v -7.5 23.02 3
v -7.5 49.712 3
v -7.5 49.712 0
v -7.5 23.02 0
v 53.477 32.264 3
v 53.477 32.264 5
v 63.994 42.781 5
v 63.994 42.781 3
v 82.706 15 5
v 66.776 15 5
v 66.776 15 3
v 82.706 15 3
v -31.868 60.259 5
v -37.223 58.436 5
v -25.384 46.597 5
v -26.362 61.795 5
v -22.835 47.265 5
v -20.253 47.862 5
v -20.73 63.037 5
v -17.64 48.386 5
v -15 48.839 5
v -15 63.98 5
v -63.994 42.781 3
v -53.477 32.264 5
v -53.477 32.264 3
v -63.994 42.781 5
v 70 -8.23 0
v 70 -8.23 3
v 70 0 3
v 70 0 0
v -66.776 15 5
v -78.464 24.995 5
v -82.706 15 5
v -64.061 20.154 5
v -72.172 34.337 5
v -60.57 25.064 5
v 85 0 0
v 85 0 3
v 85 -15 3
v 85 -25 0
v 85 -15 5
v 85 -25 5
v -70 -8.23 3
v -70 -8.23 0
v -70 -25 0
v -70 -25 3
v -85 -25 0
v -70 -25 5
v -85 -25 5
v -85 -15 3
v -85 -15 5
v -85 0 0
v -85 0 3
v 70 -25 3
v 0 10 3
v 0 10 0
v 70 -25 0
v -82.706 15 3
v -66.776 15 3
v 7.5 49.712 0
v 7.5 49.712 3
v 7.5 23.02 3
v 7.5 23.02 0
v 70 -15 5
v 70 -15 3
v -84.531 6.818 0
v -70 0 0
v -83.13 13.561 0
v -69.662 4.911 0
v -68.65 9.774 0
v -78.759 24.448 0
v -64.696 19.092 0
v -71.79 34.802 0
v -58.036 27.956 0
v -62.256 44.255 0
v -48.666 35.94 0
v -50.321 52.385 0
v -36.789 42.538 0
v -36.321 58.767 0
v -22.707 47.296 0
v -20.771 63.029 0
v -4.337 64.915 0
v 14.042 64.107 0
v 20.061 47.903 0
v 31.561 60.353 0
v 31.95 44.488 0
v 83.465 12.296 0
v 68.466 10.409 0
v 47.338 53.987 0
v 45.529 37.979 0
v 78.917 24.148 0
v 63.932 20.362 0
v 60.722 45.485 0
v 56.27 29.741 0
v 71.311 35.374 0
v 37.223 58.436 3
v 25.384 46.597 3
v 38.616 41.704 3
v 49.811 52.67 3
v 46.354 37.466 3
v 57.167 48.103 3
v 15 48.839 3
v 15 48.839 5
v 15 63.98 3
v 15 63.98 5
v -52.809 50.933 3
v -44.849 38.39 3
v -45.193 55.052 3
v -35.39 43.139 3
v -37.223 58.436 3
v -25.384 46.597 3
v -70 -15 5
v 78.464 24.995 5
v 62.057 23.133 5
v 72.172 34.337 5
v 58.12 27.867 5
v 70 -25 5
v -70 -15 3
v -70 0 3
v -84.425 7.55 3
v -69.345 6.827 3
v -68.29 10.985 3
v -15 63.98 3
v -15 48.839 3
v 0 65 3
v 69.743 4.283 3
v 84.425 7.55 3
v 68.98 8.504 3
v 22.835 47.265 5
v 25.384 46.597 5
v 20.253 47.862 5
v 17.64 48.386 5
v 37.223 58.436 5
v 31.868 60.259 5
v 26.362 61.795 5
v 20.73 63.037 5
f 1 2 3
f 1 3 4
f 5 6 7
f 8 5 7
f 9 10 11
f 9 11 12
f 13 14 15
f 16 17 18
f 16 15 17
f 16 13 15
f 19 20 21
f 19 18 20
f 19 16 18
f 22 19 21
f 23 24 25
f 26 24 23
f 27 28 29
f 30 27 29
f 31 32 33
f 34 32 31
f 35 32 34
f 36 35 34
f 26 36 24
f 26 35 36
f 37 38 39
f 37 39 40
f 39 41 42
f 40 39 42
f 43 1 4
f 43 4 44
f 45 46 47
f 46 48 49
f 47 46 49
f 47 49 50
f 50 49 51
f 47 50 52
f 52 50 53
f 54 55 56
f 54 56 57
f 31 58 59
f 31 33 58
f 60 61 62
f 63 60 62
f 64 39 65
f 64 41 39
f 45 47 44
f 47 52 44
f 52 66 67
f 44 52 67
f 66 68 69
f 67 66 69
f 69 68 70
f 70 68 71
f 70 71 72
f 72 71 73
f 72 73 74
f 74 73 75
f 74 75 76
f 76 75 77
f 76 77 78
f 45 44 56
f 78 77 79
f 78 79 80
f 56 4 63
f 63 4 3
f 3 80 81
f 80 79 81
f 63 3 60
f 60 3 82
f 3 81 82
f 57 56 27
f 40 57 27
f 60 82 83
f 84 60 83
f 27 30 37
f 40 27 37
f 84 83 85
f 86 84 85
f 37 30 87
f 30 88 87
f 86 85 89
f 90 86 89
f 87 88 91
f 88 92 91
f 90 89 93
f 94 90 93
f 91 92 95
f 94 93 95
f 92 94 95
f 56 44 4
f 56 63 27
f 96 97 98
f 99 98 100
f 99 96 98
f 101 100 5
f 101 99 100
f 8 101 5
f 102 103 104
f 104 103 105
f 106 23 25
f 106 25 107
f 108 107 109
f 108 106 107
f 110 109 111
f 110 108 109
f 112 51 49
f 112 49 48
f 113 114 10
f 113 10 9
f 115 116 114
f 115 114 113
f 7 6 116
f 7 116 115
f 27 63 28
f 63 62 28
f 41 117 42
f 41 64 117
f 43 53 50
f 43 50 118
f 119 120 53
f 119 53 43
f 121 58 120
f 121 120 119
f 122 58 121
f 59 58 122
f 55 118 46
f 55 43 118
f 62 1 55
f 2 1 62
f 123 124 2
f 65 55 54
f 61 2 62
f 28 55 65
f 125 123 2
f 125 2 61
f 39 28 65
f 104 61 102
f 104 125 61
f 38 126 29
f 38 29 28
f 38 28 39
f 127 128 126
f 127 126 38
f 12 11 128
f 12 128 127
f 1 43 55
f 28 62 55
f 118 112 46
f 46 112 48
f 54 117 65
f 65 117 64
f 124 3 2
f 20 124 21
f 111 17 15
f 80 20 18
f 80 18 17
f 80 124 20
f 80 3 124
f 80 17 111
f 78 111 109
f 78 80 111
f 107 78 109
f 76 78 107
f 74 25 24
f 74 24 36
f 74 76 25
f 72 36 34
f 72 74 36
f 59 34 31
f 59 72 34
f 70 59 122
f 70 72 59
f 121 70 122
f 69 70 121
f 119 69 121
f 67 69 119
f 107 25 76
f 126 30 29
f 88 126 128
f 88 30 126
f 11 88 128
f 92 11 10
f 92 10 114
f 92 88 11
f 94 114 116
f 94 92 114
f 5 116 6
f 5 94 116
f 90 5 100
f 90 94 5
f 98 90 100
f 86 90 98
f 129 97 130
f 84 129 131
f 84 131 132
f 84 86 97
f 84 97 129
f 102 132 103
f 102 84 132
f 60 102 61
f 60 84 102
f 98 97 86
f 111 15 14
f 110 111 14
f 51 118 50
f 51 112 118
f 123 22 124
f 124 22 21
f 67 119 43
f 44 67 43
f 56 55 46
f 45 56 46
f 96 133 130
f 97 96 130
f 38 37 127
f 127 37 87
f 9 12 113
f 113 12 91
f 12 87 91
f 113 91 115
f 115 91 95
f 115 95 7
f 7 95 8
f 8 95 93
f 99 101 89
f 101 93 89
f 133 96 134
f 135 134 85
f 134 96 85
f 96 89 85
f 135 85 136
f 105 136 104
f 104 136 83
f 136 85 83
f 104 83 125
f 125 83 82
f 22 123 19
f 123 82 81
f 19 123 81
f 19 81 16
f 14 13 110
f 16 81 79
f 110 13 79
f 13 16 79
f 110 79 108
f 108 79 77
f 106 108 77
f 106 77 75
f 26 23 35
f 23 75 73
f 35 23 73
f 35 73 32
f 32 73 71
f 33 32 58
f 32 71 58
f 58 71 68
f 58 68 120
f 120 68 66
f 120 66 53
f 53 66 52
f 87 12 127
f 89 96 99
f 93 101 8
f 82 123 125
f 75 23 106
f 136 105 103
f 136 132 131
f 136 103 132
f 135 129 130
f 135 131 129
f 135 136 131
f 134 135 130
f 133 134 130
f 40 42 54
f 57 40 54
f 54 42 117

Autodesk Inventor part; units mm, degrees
ref_plane "YZ Plane" through (0, 0, 0) normal (1, 0, 0) x (0, 1, 0)
ref_plane "XZ Plane" through (0, 0, 0) normal (0, 1, 0) x (-1, 0, 0)
ref_plane "XY Plane" through (0, 0, 0) normal (0, 0, 1) x (1, 0, 0)
sketch "Skizze1" plane through (0, 0, 0) normal (1, 0, 0) x (0, 1, 0)
  point P0 (0, 0)
sketch "Skizze2" plane through (0, 0, 0) normal (0, 0, 1) x (1, 0, 0)
  line L0 (0, 0) -> (0, 50)
  ellipse E0 centre (0, 0) end of major axis (0, 50) minor radius 70
  ellipse E1 centre (0, 0) end of major axis (85, 0) minor radius 65
  point P0 (0, 65)
  dimension "d3" = 70
  dimension "d4" = 85
  dimension "d1" = 50
  dimension "d5" = 15
extrude "Extrusion1" add sketch "Skizze2" along normal blind 5
sketch "Skizze4" plane through (0, 0, 5) normal (0, 0, 1) x (1, 0, 0)
  line L0 (-138.5421, 0) -> (141.5539, 0)
  line L1 (141.5539, 0) -> (141.5539, -100.2494)
  line L2 (141.5539, -100.2494) -> (-138.5421, -100.2494)
  line L3 (-138.5421, -100.2494) -> (-138.5421, 0)
extrude "Extrusion3" cut sketch "Skizze4" against normal blind 5
sketch "Skizze5" plane through (0, 0, 5) normal (0, 0, 1) x (1, 0, 0)
  line L0 (-85, 0) -> (-70, 0)
  line L1 (-70, 0) -> (-70, -25)
  line L2 (-70, -25) -> (-85, -25)
  line L3 (-85, -25) -> (-85, 0)
  line L4 (70, 0) -> (85, 0)
  line L5 (85, 0) -> (85, -25)
  line L6 (85, -25) -> (70, -25)
  line L7 (70, -25) -> (70, 0)
  dimension "d13" = 25
  dimension "d14" = 25
extrude "Extrusion4" add sketch "Skizze5" against normal blind 5
sketch "Skizze7" plane through (0, 0, 5) normal (0, 0, 1) x (1, 0, 0)
  line L0 (14.5161, 65.7113) -> (16.129, 65.7113)
  line L1 (16.129, 65.7113) -> (16.129, 66.0339)
  line L2 (16.129, 66.0339) -> (14.5161, 66.0339)
  line L3 (14.5161, 66.0339) -> (14.5161, 65.7113)
  line L4 (-15, 28.2919) -> (15, 28.2919)
  line L5 (15, 28.2919) -> (15, 68.6145)
  line L6 (15, 68.6145) -> (-15, 68.6145)
  line L7 (-15, 68.6145) -> (-15, 28.2919)
  line L8 (-70, -25) -> (-85, -25) projected
  line L9 (-85, -25) -> (-85, 0) projected
  ellipse E0 centre (0, 0) end of major axis (-85, 0) minor radius 65 (85, 0) -> (-85, 0) ccw projected
  line L10 (85, 0) -> (85, -25) projected
  line L11 (85, -25) -> (70, -25) projected
  line L12 (70, -25) -> (70, 0) projected
  ellipse E1 centre (0, 0) end of major axis (-70, 0) minor radius 50 (70, 0) -> (-70, 0) ccw projected
  line L13 (-70, 0) -> (-70, -25) projected
  line L14 (0, -43.7229) -> (0, 87.3374) projected
  dimension "d20" = 30
extrude "Extrusion5" cut sketch "Skizze7" against normal blind 2 contours L3 L2 L5 L0 | L0 L5 E0 L14 L6 L2 L3 | L5 E1 L14 E0 | L5 L4 L14 E1 | L14 E1 L7 E0 | E0 L7 L6 L14 | L14 L4 L7 E1
sketch "Skizze8" plane through (0, 0, 5) normal (0, 0, 1) x (1, 0, 0)
  ellipse E0 centre (0, 0) end of major axis (-85, 0) minor radius 65 (85, 0) -> (15, 63.9799) ccw projected
  line L0 (0, 0) -> (49.3064, 49.3064) construction
  line L1 (-121.351, 0) -> (133.1061, 0) construction
  line L2 (76.2939, 97.5071) -> (19.9385, 41.1517)
  line L3 (19.9385, 41.1517) -> (41.1517, 19.9385)
  line L4 (41.1517, 19.9385) -> (92.1355, 70.9223)
  line L5 (76.2939, 97.5071) -> (92.1355, 70.9223)
  dimension "d23" = 45
  dimension "d24" = 30
extrude "Extrusion6" cut sketch "Skizze8" against normal blind 2
sketch "Skizze9" plane through (0, 0, 5) normal (0, 0, 1) x (1, 0, 0)
  line L0 (52.5724, 15) -> (140.4, 15)
  line L1 (140.4, 15) -> (140.4, -15)
  line L2 (140.4, -15) -> (52.5724, -15)
  line L3 (52.5724, -15) -> (52.5724, 15)
  line L4 (-125.4, 0) -> (157.4, 0) projected
  dimension "d27" = 30
extrude "Extrusion7" cut sketch "Skizze9" against normal blind 2
sketch "Skizze10" plane through (0, 0, 5) normal (0, 0, 1) x (1, 0, 0)
  ellipse E0 centre (0, 0) end of major axis (-70, 0) minor radius 50 (-15, 48.8386) -> (-70, 0) ccw projected
  line L0 (0, 0) -> (-45.6382, 45.6382) construction
  line L1 (-155, 0) -> (125, 0) projected
  line L2 (-28.1942, 6.981) -> (-6.981, 28.1942)
  line L3 (-6.981, 28.1942) -> (-56.587, 77.8002)
  line L4 (-56.587, 77.8002) -> (-77.8002, 56.587)
  line L5 (-28.1942, 6.981) -> (-77.8002, 56.587)
  dimension "d30" = 45
  dimension "d31" = 30
extrude "Extrusion8" cut sketch "Skizze10" against normal blind 2
sketch "Skizze11" plane through (0, 0, 5) normal (0, 0, 1) x (1, 0, 0)
  ellipse E0 centre (0, 0) end of major axis (-70, 0) minor radius 50 (-53.4768, 32.2636) -> (-70, 0) ccw projected
  line L0 (-171.6, -15) -> (-171.6, 15)
  line L1 (-171.6, 15) -> (-38.4, 15)
  line L2 (-38.4, 15) -> (-38.4, -15)
  line L3 (-38.4, -15) -> (-171.6, -15)
  line L4 (-188.6, 0) -> (130.6, 0) projected
  dimension "d34" = 30
extrude "Extrusion9" cut sketch "Skizze11" against normal blind 2
sketch "Skizze12" plane through (0, 0, 3) normal (0, 0, 1) x (1, 0, 0)
  ellipse E0 centre (0, 0) end of major axis (-70, 0) minor radius 50 (15, 48.8386) -> (-15, 48.8386) ccw projected
  line L0 (-15, 48.8386) -> (-15, 63.9799) projected
  line L1 (-7.5, 49.7122) -> (-7.5, 23.0205)
  line L2 (0, -43) -> (0, 83) construction
  line L3 (7.5, 49.7122) -> (7.5, 23.0205)
  line L4 (-7.5, 23.0205) -> (-70, -8.2295)
  line L5 (-70, 0) -> (-70, -15) construction
  line L6 (7.5, 23.0205) -> (70, -8.2295)
  line L7 (70, -15) -> (70, 0) construction
  line L8 (-70, -8.2295) -> (-70, -25)
  line L9 (70, -25) -> (70, -8.2295)
  line L10 (-7.5, 49.7122) -> (0, 53)
  line L11 (0, 53) -> (7.5, 49.7122)
  line L12 (0, 10) -> (-70, -25)
  line L13 (0, 10) -> (70, -25)
  dimension "d37" = 15
  dimension "d41" = 53
  dimension "d43" = 15
  dimension "d44" = 15
  dimension "d45" = 10
extrude "Extrusion10" add sketch "Skizze12" against normal blind 3
properties part number "Laseraufbau"
